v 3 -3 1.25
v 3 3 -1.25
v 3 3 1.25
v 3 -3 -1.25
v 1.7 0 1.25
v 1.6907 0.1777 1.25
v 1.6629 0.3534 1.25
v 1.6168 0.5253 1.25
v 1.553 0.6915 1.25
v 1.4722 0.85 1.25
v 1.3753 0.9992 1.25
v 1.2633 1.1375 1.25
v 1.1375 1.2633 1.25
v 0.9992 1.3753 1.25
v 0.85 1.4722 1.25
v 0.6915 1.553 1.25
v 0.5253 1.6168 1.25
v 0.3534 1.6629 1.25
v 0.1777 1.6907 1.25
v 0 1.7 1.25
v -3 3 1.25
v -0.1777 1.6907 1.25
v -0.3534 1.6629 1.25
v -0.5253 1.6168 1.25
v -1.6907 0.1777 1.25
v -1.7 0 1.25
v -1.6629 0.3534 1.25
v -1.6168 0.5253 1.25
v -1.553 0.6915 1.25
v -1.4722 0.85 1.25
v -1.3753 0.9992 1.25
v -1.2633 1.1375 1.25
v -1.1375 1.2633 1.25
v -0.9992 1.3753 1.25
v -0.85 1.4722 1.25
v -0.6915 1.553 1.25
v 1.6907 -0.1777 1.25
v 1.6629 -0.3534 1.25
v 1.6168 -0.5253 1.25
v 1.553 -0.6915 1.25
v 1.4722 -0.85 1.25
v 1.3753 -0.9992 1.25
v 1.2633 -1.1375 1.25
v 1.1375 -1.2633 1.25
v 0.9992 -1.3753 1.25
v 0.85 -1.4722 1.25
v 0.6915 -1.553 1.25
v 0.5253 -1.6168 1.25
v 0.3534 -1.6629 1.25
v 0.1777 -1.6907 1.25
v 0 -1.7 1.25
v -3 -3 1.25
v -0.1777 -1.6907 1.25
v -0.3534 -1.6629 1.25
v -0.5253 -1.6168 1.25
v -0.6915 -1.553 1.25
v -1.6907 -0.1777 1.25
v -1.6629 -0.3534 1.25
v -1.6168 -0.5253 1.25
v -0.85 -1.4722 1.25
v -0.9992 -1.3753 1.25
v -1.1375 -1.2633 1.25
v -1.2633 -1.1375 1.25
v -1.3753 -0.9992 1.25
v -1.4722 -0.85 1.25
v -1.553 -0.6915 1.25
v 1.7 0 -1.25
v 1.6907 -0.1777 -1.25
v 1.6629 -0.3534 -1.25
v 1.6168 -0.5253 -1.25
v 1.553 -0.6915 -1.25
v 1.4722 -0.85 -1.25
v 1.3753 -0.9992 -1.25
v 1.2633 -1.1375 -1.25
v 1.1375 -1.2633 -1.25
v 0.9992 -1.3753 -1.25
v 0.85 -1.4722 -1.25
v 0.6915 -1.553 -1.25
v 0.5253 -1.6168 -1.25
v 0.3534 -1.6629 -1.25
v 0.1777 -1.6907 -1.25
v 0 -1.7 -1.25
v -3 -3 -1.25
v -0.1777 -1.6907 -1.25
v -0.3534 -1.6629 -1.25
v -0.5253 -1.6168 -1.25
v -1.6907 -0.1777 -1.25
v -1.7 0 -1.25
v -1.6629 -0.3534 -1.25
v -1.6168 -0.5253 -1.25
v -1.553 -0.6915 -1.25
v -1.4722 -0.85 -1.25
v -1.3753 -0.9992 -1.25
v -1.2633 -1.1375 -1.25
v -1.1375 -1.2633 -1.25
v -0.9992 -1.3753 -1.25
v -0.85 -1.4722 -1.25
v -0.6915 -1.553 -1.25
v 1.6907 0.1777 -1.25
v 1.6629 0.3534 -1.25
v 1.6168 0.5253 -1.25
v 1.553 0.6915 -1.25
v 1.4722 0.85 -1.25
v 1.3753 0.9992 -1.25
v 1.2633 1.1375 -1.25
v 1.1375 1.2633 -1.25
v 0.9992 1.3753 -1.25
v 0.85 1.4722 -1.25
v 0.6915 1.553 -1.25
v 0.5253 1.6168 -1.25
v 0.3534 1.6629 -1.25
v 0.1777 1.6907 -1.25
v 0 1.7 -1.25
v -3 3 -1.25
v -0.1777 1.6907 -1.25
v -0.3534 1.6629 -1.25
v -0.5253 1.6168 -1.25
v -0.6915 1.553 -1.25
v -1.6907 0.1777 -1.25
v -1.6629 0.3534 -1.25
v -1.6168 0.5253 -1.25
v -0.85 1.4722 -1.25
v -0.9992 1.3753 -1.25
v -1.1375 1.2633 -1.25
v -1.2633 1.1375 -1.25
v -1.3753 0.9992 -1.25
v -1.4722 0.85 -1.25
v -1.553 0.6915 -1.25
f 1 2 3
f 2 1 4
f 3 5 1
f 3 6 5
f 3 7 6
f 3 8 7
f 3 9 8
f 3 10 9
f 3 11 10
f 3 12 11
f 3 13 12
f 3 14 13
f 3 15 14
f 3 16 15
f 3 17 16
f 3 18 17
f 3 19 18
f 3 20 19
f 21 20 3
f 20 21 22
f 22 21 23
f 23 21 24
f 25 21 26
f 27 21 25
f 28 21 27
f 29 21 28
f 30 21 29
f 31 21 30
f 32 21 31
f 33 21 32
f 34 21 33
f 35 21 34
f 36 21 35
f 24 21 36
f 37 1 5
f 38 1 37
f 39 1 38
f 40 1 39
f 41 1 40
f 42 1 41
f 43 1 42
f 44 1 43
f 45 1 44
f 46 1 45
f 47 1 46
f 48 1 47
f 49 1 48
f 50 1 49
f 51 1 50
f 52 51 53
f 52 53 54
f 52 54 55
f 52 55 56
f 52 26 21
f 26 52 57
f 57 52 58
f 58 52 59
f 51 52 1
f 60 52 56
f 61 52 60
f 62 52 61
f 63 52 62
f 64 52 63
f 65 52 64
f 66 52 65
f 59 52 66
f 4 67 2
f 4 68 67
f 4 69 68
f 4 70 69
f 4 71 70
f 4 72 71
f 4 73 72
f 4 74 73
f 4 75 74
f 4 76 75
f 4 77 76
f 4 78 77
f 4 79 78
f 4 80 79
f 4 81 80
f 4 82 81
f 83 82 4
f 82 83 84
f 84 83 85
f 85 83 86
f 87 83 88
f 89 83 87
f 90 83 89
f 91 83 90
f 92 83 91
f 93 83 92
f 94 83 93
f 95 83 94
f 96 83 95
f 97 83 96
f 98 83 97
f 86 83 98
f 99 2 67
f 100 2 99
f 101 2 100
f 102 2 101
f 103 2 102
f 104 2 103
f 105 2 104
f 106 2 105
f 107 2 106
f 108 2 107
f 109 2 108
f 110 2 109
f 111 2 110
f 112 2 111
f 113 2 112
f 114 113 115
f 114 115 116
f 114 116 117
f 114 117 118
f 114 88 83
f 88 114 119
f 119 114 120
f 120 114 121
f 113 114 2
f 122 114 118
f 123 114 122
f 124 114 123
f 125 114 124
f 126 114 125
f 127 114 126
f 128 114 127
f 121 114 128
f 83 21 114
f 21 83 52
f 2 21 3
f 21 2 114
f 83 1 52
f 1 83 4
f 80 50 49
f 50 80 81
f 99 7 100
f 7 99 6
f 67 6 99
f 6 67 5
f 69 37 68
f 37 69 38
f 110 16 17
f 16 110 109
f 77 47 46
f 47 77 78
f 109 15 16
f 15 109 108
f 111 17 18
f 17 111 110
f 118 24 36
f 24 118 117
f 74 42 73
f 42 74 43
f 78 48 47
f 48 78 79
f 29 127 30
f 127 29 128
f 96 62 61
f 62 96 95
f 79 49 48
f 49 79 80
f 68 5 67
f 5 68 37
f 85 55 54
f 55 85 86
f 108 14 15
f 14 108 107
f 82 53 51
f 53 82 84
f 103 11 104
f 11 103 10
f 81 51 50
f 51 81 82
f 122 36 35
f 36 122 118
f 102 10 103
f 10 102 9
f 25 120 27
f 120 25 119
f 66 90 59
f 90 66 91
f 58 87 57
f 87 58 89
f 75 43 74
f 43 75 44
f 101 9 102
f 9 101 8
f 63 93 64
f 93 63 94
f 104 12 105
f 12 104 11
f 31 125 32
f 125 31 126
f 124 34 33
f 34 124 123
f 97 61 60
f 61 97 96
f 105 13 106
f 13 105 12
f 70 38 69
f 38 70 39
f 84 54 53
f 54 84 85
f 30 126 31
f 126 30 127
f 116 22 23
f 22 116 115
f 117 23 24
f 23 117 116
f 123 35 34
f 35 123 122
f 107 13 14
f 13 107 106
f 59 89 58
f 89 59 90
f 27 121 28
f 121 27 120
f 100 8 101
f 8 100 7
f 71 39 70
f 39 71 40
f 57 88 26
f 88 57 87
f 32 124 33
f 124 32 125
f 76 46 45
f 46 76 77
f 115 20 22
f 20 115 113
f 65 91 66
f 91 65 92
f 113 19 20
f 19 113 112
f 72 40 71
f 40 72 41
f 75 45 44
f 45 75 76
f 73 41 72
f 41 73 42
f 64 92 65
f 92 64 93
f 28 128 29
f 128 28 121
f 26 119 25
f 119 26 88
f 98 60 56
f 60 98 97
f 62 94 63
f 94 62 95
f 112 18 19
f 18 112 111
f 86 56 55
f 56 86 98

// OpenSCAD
// Square nut.
$fn = 60;
eps = 0.02;
thread_d = 3.4;
side = 6;
thickness = 2.5;
difference() {
    cube([side, side, thickness], center = true);
    translate([0, 0, -thickness / 2 - eps]) cylinder(d = thread_d, h = thickness + 2 * eps);
}
